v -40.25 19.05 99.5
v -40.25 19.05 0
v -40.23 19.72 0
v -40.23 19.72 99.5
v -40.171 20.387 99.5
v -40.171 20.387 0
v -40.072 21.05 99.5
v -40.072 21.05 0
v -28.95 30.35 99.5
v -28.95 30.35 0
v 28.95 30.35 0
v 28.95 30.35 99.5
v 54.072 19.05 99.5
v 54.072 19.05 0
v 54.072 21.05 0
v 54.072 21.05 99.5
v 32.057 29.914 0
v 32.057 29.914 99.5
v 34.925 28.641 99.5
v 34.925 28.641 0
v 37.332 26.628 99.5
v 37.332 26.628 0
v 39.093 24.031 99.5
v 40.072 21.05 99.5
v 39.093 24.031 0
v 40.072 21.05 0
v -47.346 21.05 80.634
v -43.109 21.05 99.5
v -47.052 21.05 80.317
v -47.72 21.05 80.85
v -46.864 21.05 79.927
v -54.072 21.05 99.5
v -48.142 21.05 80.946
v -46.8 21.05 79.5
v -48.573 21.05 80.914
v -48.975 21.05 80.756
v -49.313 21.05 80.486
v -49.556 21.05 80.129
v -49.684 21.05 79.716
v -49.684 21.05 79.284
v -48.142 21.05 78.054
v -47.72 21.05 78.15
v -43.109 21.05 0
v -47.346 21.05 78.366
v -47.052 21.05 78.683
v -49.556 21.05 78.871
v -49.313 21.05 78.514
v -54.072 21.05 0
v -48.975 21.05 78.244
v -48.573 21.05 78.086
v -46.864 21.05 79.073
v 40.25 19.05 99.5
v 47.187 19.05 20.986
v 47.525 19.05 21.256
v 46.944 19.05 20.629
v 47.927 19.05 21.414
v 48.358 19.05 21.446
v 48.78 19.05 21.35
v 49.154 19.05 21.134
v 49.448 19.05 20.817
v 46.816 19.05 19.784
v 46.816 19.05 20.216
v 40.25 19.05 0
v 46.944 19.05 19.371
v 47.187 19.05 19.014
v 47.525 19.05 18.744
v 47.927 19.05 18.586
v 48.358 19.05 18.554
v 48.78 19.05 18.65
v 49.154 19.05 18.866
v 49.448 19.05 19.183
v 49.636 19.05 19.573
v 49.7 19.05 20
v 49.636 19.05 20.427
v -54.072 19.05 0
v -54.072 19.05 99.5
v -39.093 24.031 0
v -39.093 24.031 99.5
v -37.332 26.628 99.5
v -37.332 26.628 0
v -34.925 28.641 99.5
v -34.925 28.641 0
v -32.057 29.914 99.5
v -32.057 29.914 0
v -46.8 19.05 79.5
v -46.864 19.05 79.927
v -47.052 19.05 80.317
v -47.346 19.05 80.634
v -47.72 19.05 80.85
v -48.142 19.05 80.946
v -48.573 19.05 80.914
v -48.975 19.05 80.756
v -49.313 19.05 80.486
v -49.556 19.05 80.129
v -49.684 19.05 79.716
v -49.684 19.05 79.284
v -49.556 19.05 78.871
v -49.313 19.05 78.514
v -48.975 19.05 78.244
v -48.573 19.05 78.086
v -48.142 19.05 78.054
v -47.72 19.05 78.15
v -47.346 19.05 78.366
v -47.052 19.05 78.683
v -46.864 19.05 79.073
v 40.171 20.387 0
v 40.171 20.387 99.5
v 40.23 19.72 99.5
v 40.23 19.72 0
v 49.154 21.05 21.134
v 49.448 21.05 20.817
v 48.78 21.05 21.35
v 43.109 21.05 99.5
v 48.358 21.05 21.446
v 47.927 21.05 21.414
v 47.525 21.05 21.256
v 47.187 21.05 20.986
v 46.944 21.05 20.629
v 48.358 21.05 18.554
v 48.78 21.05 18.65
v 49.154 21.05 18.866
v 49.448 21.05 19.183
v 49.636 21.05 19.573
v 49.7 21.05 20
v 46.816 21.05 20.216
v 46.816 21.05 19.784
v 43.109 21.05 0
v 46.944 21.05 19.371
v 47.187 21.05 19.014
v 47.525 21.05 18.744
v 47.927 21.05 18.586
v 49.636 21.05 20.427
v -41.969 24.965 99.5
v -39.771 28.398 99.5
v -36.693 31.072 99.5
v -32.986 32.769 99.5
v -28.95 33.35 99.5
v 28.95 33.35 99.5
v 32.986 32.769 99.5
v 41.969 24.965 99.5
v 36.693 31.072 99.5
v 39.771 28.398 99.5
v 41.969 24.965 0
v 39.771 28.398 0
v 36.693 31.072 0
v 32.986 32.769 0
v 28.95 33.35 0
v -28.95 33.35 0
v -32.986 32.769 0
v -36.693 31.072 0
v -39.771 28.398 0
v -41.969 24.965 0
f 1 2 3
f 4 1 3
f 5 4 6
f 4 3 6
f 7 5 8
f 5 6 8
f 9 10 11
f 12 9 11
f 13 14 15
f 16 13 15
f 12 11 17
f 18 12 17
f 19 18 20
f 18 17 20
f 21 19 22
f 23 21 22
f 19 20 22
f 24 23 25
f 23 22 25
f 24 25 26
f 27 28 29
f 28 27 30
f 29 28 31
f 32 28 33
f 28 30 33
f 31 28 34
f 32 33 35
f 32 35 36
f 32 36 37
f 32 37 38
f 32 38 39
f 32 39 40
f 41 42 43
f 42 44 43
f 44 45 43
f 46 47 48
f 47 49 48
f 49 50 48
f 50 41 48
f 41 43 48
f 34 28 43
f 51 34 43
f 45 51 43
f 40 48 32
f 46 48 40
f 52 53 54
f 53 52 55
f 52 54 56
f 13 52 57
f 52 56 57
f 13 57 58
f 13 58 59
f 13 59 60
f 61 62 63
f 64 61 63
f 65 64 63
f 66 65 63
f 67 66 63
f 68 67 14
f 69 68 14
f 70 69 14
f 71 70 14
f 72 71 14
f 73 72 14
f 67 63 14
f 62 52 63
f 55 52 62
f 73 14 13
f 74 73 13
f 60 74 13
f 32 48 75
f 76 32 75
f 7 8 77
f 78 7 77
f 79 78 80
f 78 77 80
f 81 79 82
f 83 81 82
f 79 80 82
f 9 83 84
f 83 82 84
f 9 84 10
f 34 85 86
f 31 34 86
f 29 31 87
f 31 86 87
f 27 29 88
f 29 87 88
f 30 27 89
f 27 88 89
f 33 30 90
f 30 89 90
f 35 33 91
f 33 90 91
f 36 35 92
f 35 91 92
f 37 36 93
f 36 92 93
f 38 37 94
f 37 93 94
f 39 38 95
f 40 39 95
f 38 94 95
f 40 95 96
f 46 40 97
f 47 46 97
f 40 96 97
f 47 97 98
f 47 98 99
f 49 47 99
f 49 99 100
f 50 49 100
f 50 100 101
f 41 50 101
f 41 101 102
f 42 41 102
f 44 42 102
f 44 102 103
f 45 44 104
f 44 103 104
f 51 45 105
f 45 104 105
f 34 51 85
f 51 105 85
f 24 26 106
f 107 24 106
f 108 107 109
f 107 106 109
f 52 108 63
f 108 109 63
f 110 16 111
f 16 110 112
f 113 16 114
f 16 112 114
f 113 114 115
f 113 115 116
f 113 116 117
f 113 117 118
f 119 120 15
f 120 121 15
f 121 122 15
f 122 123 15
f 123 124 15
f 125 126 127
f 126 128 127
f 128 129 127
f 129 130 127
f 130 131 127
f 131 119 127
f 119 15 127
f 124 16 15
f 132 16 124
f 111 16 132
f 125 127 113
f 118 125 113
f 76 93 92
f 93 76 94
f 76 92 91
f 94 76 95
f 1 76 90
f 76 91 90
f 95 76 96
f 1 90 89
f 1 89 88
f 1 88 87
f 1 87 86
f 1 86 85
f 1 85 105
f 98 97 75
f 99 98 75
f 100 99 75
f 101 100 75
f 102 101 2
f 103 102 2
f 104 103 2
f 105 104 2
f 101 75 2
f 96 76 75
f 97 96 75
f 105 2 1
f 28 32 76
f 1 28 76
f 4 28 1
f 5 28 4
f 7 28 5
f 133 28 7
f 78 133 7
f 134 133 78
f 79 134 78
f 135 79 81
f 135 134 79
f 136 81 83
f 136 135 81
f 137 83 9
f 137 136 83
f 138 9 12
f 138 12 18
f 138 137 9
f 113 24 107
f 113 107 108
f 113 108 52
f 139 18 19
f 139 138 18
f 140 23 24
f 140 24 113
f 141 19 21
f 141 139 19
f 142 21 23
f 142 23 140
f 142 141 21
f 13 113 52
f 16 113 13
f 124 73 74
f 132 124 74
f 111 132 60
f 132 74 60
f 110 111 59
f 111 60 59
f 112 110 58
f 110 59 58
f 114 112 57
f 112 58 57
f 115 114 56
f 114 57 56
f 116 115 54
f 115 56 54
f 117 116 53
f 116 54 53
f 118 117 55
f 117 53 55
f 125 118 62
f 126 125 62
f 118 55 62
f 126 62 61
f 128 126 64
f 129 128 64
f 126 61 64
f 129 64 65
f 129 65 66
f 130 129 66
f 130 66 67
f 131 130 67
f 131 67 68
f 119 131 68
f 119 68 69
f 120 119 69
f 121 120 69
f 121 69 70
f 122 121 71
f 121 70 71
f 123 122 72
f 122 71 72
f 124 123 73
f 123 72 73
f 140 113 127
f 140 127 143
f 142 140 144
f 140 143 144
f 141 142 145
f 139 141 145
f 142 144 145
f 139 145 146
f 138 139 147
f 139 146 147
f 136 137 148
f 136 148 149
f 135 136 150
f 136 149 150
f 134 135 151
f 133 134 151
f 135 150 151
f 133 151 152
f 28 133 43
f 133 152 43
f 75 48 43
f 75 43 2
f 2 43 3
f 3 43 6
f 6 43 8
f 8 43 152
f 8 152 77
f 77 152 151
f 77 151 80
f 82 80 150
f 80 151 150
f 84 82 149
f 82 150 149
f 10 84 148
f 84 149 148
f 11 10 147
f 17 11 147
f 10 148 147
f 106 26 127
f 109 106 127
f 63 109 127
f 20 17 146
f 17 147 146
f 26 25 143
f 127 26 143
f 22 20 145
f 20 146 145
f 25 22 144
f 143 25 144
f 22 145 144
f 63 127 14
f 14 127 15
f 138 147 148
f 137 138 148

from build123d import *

# Parameters (mm, degrees)
BOSS_EXTRUDE1_DEPTH = 99.5
SKETCH3_R           = 1.45
CUT_EXTRUDE1_DEPTH  = 2


with BuildPart() as part:
    # Sketch1 → Boss-Extrude1 (new body)
    with BuildSketch(Plane.XY):
        with BuildLine():
            Line((-43.109449142, 21.05), (-40.071600604, 21.05))
            ThreePointArc((-40.071600604, 21.05), (-36.198793003, 27.718621574), (-28.95, 30.35))
            Line((-28.95, 30.35), (28.95, 30.35))
            ThreePointArc((28.95, 30.35), (36.198793003, 27.718621574), (40.071600604, 21.05))
            Line((40.071600604, 21.05), (43.109449142, 21.05))
            ThreePointArc((43.109449142, 21.05), (38.327899552, 29.845600956), (28.95, 33.35))
            Line((28.95, 33.35), (-28.95, 33.35))
            ThreePointArc((-28.95, 33.35), (-38.327899552, 29.845600956), (-43.109449142, 21.05))
        make_face()
        with BuildLine():
            Line((-43.25, 19.05), (-40.25, 19.05))
            ThreePointArc((-40.25, 19.05), (-40.205311787, 20.053970411), (-40.071600604, 21.05))
            Line((-40.071600604, 21.05), (-43.109449142, 21.05))
            ThreePointArc((-43.109449142, 21.05), (-43.214819009, 20.052466277), (-43.25, 19.05))
        make_face()
        with BuildLine():
            Line((-50.25, 19.05), (-43.25, 19.05))
            ThreePointArc((-43.25, 19.05), (-43.214819009, 20.052466277), (-43.109449142, 21.05))
            Line((-43.109449142, 21.05), (-54.071600604, 21.05))
            Line((-54.071600604, 21.05), (-54.071600604, 19.05))
            Line((-54.071600604, 19.05), (-50.25, 19.05))
        make_face()
        with BuildLine():
            ThreePointArc((40.071600604, 21.05), (40.205311787, 20.053970411), (40.25, 19.05))
            Line((40.25, 19.05), (43.25, 19.05))
            ThreePointArc((43.25, 19.05), (43.214819009, 20.052466277), (43.109449142, 21.05))
            Line((43.109449142, 21.05), (40.071600604, 21.05))
        make_face()
        with BuildLine():
            ThreePointArc((43.109449142, 21.05), (43.214819009, 20.052466277), (43.25, 19.05))
            Line((43.25, 19.05), (50.25, 19.05))
            Line((50.25, 19.05), (54.071600604, 19.05))
            Line((54.071600604, 19.05), (54.071600604, 21.05))
            Line((54.071600604, 21.05), (43.109449142, 21.05))
        make_face()
    extrude(amount=BOSS_EXTRUDE1_DEPTH)

    # Sketch3 → Cut-Extrude1 (cut)
    with BuildSketch(Plane.XZ.offset(-19.05)):
        with Locations((-48.25, 79.5)):
            Circle(SKETCH3_R)
        with Locations((48.25, 20)):
            Circle(SKETCH3_R)
    extrude(amount=-CUT_EXTRUDE1_DEPTH, mode=Mode.SUBTRACT)


solid = part.part
